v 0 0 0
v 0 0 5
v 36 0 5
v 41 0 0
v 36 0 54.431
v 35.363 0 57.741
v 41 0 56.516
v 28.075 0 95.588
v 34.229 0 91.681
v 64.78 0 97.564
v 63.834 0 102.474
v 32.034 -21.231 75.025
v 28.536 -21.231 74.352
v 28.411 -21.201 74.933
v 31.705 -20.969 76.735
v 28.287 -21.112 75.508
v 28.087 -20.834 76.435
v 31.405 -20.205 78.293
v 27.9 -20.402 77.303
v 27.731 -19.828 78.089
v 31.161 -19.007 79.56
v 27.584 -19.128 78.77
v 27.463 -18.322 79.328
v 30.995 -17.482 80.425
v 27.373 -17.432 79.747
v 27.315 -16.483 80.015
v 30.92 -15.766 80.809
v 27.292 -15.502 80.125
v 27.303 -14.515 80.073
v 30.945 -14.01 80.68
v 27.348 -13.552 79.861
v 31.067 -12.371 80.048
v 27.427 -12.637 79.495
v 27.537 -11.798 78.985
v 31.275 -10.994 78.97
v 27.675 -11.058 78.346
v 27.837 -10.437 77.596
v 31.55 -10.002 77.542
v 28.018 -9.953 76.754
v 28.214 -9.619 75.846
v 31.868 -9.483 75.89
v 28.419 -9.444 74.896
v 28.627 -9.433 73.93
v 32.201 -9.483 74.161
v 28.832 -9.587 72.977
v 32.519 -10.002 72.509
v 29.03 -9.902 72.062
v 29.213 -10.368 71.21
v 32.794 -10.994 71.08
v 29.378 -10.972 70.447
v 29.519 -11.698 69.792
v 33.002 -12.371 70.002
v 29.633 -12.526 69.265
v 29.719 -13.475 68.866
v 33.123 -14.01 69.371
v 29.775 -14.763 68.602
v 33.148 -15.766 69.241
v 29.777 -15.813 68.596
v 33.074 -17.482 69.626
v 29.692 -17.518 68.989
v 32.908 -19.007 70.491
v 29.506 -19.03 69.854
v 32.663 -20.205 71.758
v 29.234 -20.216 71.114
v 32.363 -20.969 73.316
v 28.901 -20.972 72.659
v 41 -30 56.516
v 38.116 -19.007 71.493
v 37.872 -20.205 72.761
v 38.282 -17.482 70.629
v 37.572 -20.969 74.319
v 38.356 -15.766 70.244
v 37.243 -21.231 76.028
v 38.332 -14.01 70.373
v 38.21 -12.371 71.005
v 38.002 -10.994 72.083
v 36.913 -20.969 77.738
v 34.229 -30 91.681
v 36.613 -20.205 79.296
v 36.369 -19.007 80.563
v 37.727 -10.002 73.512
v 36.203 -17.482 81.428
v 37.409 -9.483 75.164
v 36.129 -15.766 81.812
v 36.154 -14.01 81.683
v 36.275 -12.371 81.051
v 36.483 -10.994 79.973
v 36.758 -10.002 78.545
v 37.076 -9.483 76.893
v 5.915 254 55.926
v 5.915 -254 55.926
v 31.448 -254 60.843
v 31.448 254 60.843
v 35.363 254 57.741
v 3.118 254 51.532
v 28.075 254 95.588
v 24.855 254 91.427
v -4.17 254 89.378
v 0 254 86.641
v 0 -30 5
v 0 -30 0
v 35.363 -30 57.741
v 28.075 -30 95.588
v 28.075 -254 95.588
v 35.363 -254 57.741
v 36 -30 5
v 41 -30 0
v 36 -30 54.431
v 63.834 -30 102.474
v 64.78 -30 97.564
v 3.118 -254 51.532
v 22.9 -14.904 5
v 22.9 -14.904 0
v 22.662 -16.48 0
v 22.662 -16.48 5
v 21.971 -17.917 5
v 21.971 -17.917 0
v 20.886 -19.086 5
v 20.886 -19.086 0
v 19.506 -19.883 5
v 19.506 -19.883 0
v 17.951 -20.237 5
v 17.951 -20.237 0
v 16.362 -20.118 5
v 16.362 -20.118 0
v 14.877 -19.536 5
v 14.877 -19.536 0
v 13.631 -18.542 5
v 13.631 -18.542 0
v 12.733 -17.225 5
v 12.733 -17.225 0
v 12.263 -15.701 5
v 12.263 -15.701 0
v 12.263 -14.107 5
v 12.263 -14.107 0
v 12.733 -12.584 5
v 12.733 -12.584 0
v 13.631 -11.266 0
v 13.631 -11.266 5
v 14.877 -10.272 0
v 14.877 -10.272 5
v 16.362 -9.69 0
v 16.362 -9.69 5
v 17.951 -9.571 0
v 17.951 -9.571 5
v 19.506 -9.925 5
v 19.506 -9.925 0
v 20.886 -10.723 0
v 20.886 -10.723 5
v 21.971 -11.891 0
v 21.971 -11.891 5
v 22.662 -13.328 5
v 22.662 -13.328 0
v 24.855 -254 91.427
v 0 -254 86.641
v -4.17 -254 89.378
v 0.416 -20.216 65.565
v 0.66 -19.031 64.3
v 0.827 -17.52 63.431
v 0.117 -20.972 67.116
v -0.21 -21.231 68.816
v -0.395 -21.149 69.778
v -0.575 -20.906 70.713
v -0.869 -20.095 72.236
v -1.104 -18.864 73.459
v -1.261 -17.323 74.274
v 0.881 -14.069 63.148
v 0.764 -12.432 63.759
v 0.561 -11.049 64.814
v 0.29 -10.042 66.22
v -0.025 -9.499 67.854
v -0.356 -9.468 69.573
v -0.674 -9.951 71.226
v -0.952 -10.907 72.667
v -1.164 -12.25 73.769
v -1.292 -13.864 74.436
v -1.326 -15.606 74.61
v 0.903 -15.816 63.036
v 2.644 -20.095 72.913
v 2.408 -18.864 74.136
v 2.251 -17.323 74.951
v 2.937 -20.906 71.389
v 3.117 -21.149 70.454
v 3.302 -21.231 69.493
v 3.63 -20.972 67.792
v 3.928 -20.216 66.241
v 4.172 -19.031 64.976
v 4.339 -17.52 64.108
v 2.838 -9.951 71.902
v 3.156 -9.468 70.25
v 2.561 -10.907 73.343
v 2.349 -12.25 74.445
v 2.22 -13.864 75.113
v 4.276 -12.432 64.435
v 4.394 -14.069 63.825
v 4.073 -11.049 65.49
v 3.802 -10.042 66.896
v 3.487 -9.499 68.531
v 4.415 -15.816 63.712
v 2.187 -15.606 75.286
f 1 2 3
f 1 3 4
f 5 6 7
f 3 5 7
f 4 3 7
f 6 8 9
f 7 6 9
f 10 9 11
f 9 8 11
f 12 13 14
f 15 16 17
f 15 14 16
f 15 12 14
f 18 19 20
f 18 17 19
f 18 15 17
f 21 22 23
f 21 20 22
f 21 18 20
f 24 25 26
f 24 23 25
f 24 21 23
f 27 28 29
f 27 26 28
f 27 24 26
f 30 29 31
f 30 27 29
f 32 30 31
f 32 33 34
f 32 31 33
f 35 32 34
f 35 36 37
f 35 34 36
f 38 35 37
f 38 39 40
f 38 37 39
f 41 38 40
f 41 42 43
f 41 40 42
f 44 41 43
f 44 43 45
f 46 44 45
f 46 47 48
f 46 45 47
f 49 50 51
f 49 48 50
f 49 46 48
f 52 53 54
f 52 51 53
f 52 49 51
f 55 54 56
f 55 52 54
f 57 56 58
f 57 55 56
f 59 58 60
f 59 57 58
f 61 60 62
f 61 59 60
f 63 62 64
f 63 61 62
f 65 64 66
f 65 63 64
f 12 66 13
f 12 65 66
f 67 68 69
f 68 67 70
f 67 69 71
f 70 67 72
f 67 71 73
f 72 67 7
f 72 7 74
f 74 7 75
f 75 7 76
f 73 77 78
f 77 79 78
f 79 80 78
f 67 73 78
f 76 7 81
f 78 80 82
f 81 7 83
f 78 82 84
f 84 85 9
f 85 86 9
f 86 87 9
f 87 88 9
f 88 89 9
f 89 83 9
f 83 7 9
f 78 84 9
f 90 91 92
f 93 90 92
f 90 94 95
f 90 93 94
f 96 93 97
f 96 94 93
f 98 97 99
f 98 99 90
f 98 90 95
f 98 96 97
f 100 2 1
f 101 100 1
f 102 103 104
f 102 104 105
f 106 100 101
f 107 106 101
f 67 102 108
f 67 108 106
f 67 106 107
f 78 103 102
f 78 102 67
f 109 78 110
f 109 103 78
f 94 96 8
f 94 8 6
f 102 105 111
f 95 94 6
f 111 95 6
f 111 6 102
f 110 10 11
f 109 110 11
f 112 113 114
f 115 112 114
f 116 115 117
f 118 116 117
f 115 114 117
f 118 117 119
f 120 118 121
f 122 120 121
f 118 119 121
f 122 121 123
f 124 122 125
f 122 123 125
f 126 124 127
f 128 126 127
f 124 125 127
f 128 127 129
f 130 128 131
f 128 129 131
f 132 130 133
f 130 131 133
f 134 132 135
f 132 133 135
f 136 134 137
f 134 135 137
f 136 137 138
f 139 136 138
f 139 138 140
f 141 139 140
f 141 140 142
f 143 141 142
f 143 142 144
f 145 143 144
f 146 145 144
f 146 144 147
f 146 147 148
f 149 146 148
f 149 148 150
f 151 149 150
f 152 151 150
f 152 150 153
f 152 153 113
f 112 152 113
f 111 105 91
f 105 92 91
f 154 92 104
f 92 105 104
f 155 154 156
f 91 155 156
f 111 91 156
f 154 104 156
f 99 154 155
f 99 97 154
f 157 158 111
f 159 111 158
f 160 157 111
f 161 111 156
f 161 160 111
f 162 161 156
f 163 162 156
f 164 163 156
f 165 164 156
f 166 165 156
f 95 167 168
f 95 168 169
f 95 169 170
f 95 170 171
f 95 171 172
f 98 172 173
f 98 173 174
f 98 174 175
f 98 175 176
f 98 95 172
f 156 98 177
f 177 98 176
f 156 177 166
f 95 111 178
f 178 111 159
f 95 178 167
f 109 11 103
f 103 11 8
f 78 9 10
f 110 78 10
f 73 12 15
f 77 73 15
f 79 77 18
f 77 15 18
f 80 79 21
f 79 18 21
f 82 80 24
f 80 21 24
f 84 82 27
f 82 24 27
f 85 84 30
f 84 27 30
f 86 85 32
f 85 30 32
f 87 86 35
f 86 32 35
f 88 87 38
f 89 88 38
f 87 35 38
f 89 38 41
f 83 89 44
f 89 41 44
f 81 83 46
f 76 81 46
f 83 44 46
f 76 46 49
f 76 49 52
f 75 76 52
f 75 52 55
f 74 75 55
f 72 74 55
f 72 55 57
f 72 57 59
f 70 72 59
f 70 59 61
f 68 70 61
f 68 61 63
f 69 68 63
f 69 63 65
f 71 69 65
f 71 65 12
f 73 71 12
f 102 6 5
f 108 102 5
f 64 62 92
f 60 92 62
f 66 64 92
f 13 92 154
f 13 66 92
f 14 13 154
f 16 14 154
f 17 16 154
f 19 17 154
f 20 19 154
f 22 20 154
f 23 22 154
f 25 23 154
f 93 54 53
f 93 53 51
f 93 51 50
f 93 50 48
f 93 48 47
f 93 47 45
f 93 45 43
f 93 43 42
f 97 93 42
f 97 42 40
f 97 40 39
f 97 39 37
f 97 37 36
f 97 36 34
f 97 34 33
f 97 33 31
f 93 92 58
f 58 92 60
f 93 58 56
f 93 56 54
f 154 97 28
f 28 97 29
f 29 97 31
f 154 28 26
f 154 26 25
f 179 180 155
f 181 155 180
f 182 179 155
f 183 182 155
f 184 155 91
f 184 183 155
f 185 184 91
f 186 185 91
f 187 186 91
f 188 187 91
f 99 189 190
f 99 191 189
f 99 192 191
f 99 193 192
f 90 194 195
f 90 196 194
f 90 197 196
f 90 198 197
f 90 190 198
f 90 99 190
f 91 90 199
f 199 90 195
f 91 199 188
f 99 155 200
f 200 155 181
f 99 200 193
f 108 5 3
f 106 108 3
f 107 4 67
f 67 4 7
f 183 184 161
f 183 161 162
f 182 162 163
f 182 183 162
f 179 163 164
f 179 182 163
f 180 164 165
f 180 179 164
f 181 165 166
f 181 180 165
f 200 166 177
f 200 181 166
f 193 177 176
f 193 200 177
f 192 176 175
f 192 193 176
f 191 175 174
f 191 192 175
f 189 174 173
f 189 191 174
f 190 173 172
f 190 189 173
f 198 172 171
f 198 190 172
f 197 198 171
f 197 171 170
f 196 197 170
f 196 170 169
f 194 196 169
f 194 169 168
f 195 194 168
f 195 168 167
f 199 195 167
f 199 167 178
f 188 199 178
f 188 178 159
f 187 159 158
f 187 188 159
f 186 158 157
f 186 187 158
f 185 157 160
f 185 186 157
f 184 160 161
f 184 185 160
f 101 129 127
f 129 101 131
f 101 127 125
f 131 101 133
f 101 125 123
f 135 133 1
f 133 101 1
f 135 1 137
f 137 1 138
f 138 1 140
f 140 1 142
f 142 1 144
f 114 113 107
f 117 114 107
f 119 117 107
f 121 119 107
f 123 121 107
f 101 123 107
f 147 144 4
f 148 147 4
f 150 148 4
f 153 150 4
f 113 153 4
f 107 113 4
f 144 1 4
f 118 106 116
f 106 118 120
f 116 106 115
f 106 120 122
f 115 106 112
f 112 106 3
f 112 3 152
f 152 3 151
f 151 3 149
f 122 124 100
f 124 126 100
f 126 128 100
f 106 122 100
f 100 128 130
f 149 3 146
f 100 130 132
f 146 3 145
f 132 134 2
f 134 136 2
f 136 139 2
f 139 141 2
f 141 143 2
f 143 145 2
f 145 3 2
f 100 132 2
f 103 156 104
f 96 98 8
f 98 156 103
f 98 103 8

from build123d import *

# Parameters (mm, degrees)
F1_DEPTH = 30
F2_R     = 5.9068086224
F3_DEPTH = 37.3459064877
F5_DEPTH = 254
F6_R     = 5.3482830895
F7_DEPTH = 25.4
F8_DEPTH = 49.7385416959


with BuildPart() as f1:
    # F0 (on Front) → F1 (new body)
    with BuildSketch(Plane.XZ):
        Polygon((0, 5), (0, 0), (41, 0), (41, 56.516070229), (34.2285000014, 91.6807044894), (64.7796728897, 97.563810386), (63.8342146871, 102.4736076107), (28.0746837728, 95.5875509623), (36, 54.4311090238), (36, 5), align=None)
    extrude(amount=F1_DEPTH)

    # F2 (on face) → F3 (cut, through all)
    with BuildSketch(Plane(origin=(44.8195825231, 0, 8.6307112067), x_dir=(0, -1, 0), z_dir=(-0.9819594449, 0, -0.1890916405))):
        with Locations((15.3243150562, 67.6144137979)):
            Circle(F2_R)
    extrude(amount=-F3_DEPTH, mode=Mode.SUBTRACT)

    # F4 (on face) → F5 (join, symmetric)
    with BuildSketch(Plane(origin=(0, 0, 0), x_dir=(-1, 0, 0), z_dir=(0, 1, 0))):
        Polygon((4.1697587408, 89.3783795312), (-28.0746837728, 95.5875509623), (-35.362594468, 57.7411780502), (-3.1181519544, 51.5320066191), align=None)
        Polygon((-31.4480777671, 60.8430350679), (-24.8551371776, 91.4274895161), (0, 86.6412443325), (-5.9146662272, 55.9261775534), align=None, mode=Mode.SUBTRACT)
    extrude(amount=F5_DEPTH, both=True)

    # F6 (on face) → F7 (cut)
    with BuildSketch(Plane(origin=(0, 0, 0), x_dir=(1, 0, 0), z_dir=(0, 0, -1))):
        with Locations((17.5516102463, 14.9040622637)):
            Circle(F6_R)
    extrude(amount=-F7_DEPTH, mode=Mode.SUBTRACT)

    # F8 (cut, through all): a face of the model
    f8_faces = [f1.faces().sort_by_distance(p)[0] for p in [
        (32.0342620964, -15.3243150562, 75.0253234491),
    ]]
    extrude(f8_faces, amount=-F8_DEPTH, mode=Mode.SUBTRACT)


solid = f1.part
